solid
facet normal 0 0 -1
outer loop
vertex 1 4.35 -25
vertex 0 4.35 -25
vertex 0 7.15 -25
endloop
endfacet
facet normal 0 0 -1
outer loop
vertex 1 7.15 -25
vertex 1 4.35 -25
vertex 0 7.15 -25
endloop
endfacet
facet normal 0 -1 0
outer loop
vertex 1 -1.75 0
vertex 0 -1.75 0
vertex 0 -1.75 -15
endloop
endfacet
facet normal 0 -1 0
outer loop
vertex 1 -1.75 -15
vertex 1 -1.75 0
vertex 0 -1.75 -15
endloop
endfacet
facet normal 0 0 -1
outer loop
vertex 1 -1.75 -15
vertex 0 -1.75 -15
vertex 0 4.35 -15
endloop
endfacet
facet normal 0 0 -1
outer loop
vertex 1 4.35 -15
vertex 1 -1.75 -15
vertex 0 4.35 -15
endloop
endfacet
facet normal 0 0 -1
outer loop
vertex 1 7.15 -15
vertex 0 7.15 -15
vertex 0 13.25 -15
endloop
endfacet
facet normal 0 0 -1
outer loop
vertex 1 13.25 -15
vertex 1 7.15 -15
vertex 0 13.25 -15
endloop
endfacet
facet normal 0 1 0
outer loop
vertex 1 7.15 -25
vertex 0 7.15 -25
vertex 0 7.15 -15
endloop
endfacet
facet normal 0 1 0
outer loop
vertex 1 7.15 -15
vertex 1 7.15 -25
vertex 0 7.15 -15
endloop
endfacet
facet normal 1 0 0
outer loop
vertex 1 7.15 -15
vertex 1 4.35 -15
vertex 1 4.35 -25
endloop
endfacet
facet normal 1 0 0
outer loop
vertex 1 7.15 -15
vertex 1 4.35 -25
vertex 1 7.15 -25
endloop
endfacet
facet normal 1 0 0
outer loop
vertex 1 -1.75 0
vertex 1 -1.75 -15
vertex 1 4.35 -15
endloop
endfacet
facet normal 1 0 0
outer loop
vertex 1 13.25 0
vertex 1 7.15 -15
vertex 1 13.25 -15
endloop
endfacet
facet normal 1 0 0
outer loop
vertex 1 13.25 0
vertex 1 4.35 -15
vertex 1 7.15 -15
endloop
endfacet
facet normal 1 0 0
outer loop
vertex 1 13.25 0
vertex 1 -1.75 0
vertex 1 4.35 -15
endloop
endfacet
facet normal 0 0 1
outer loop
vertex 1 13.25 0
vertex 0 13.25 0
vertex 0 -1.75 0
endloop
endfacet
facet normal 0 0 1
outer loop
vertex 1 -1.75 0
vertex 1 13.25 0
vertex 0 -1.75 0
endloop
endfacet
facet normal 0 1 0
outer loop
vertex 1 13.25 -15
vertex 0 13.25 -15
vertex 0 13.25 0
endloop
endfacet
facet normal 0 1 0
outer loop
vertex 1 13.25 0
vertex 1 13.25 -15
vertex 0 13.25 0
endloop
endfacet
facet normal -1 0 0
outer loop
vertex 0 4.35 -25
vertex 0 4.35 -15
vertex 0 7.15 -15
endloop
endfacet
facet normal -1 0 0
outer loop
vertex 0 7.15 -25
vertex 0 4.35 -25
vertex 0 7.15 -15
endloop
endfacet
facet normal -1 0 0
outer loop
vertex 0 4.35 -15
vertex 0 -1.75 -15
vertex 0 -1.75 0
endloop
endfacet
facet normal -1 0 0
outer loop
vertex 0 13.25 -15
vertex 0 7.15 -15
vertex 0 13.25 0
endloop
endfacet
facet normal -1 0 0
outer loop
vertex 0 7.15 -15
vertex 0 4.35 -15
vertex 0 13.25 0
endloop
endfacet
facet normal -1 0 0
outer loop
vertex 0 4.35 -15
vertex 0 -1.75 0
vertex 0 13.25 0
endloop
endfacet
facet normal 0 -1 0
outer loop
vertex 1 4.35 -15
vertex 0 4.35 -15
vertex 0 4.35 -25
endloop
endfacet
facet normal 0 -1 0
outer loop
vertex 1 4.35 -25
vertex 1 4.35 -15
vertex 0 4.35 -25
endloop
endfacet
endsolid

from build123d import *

# Parameters (mm, degrees)
F1_DEPTH = 1


# Not quite as in the source:
# - a feature names something its author has since deleted; it is built from what else it names


with BuildPart() as f1:
    # F0 (on Right) → F1 (new body)
    with BuildSketch(Plane.YZ):
        Polygon((11.5, 0), (0, 0), (-1.75, 0), (-1.75, -15), (0, -15), (4.35, -15), (4.35, -25), (5.25, -25), (6.25, -25), (7.15, -25), (7.15, -15), (11.5, -15), (13.25, -15), (13.25, 0), align=None)
    extrude(amount=F1_DEPTH)


solid = f1.part
